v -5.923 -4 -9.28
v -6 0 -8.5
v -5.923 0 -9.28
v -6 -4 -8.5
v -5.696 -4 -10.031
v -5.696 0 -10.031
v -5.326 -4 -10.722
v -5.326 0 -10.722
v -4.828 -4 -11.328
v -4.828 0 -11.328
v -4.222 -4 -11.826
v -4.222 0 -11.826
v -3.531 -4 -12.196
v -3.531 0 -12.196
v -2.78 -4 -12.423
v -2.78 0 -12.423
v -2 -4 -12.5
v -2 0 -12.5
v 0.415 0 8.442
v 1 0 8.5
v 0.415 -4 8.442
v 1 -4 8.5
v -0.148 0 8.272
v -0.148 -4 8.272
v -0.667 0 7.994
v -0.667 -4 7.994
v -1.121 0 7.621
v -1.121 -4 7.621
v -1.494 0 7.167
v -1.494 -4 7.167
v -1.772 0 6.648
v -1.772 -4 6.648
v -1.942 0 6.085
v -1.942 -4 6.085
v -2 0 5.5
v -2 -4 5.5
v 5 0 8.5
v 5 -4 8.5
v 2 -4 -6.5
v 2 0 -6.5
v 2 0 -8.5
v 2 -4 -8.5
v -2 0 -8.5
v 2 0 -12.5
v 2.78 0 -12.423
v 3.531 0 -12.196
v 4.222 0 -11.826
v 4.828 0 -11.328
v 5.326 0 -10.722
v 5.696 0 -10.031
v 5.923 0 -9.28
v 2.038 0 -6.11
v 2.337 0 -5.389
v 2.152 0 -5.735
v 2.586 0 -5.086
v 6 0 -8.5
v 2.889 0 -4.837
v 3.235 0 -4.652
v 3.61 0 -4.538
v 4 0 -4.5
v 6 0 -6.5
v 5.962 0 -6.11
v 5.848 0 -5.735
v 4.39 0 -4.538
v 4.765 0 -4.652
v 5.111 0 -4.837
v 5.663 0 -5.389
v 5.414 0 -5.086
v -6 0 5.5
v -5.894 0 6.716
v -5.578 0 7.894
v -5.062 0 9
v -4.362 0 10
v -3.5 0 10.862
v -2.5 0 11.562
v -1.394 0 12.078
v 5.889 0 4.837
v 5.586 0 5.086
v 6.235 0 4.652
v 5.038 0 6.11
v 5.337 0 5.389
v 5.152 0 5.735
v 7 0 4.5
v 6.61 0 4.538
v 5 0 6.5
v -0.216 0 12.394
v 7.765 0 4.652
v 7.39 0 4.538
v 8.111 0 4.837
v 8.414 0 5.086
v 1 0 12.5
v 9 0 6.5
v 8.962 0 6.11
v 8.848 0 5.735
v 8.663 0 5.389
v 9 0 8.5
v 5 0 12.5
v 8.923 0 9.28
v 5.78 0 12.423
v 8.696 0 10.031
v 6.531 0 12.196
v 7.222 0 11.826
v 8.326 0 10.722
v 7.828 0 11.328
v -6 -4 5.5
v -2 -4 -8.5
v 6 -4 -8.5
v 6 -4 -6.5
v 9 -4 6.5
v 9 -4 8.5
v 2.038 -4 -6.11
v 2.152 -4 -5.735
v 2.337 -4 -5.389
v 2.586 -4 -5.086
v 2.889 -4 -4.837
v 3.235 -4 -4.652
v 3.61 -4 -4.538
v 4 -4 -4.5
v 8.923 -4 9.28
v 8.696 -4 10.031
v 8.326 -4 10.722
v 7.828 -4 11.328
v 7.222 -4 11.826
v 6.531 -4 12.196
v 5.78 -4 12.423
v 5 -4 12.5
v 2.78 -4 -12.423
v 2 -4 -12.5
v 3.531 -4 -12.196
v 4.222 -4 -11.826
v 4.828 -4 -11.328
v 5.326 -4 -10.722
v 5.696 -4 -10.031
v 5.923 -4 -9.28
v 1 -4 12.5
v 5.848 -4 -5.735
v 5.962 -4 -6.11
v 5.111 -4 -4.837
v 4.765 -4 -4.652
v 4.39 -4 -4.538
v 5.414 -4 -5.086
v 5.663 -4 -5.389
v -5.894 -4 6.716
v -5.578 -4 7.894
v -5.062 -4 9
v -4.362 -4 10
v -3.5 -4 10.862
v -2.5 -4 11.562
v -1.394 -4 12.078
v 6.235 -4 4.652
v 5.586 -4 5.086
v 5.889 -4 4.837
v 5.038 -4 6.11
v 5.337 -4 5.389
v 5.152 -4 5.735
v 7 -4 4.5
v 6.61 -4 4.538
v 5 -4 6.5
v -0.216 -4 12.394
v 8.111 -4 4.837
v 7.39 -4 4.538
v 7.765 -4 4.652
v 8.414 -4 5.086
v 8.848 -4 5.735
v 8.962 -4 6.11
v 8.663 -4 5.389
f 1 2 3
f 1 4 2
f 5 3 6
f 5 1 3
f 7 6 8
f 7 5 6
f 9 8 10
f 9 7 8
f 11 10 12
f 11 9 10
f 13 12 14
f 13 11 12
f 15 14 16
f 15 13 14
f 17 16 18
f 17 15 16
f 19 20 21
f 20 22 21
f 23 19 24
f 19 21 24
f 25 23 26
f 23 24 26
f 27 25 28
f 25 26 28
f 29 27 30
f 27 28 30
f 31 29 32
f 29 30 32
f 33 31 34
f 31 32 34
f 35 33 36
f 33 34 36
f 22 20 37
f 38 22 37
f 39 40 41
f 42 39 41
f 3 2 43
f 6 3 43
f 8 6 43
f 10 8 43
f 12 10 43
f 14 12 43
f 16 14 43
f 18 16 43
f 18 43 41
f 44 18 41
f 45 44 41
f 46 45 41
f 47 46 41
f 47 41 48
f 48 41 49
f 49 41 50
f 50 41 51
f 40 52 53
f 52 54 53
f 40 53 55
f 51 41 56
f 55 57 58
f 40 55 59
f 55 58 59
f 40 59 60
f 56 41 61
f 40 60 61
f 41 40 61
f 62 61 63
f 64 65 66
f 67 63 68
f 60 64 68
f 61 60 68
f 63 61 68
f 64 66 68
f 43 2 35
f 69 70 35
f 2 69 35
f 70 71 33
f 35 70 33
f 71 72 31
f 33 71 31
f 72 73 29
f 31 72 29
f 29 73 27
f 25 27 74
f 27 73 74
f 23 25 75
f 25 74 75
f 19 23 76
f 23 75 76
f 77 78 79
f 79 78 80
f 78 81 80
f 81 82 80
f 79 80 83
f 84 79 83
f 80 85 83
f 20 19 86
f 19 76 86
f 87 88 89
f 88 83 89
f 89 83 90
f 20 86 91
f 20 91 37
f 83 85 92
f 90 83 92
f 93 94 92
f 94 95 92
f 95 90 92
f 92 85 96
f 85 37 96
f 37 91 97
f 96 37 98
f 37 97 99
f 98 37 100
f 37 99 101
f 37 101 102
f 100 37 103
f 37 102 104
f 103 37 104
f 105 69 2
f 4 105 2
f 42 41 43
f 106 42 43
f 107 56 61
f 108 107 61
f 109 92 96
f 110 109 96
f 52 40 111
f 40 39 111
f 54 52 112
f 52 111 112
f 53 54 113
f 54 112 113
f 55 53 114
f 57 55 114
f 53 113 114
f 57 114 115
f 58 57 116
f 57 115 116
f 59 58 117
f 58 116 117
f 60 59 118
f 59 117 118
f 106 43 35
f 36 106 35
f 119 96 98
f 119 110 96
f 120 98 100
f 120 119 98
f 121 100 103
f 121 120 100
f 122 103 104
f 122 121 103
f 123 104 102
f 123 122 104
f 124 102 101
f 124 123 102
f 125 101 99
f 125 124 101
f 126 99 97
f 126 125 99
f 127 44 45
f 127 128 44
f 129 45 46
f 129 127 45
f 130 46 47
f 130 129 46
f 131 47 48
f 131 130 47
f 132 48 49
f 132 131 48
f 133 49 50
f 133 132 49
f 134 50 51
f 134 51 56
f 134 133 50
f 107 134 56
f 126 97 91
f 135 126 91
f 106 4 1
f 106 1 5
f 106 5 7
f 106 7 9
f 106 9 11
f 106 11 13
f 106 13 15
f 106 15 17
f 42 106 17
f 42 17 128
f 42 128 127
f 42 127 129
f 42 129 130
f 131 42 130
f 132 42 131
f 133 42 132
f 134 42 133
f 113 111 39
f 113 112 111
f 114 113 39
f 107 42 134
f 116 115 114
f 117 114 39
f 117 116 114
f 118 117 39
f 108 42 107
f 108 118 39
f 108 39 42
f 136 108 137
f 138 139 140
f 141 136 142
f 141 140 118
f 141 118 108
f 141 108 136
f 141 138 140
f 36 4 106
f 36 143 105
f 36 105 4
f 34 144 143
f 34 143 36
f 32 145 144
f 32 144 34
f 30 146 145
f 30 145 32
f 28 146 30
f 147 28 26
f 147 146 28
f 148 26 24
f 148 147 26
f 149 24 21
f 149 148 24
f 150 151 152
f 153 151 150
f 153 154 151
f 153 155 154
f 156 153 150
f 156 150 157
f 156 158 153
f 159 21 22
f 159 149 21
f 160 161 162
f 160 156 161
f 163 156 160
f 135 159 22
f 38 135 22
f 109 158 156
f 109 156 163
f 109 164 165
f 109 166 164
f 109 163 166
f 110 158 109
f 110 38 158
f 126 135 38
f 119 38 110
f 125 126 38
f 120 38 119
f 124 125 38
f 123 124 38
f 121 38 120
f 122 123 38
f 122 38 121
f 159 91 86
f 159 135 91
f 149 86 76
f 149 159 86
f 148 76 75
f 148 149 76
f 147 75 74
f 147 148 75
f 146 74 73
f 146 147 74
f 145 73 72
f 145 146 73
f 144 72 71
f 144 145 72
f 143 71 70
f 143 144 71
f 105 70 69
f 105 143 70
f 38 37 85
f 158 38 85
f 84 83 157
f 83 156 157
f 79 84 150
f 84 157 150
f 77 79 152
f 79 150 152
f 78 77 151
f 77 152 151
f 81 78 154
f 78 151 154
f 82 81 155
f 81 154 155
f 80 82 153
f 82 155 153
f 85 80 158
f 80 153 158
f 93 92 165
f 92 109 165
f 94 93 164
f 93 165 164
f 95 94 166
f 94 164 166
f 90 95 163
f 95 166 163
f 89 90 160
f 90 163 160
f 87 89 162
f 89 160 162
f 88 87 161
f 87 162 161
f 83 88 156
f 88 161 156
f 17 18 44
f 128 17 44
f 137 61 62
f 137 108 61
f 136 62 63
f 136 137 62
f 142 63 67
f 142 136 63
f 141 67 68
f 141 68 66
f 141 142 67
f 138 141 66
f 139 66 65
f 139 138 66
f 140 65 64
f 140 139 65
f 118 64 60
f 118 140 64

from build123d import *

# Parameters (mm, degrees)
F1_DEPTH = 4
F2_R     = 4
F3_R     = 1.99999
F4_R     = 3
F5_R     = 7


# Not quite as in the source:
# - a fillet or chamfer is up to 0.001 mm smaller than in the source, because OpenCascade refuses the exact size


with BuildPart() as f1:
    # F0 (on Front) → F1 (new body)
    with BuildSketch(Plane.XZ):
        Polygon((9, 4.5), (9, 12.5), (-6, 12.5), (-6, -12.5), (6, -12.5), (6, -4.5), (2, -4.5), (2, -8.5), (-2, -8.5), (-2, 8.5), (5, 8.5), (5, 4.5), align=None)
    extrude(amount=F1_DEPTH)

    # F2
    f2_edges = [f1.edges().sort_by_distance(p)[0] for p in [
        (9, -2, 12.5),
        (-6, -2, -12.5),
        (6, -2, -12.5),
    ]]
    fillet(f2_edges, radius=F2_R)

    # F3 (radius 2 in the source; OpenCascade refuses exactly that, so slightly less here)
    f3_edges = [f1.edges().sort_by_distance(p)[0] for p in [
        (6, -2, -4.5),
        (2, -2, -4.5),
        (9, -2, 4.5),
        (5, -2, 4.5),
    ]]
    fillet(f3_edges, radius=F3_R)

    # F4
    f4_edges = [f1.edges().sort_by_distance(p)[0] for p in [
        (-2, -2, 8.5),
    ]]
    fillet(f4_edges, radius=F4_R)

    # F5
    f5_edges = [f1.edges().sort_by_distance(p)[0] for p in [
        (-6, -2, 12.5),
    ]]
    fillet(f5_edges, radius=F5_R)


solid = f1.part
